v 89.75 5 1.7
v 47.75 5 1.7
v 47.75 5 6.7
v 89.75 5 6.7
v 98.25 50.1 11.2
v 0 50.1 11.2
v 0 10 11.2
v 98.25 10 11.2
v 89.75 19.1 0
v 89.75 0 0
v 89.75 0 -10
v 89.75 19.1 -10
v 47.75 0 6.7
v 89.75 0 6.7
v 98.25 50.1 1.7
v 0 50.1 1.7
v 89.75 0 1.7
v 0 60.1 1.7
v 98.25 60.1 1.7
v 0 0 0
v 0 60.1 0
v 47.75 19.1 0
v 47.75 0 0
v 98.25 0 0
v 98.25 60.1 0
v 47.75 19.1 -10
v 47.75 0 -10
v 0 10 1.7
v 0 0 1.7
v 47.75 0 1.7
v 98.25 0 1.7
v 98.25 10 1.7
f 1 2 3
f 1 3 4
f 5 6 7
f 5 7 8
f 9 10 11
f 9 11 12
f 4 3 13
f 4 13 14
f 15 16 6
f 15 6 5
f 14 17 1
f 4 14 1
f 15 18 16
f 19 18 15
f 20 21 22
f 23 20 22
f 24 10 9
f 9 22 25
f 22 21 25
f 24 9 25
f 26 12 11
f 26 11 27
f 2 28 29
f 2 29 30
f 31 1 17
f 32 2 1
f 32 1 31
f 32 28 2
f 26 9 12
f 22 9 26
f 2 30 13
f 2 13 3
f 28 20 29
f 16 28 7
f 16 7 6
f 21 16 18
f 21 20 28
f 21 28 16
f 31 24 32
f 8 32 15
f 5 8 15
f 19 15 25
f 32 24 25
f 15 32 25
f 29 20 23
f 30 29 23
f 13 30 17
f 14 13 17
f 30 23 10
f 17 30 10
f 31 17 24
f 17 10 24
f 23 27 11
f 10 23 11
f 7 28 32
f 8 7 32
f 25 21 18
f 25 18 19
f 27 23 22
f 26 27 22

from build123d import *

# Parameters (mm, degrees)
SKETCH_1_W      = 98.25
SKETCH_1_H      = 60.1
EXTRUDE_1_DEPTH = 1.7
SKETCH_2_W      = 98.25
SKETCH_2_H      = 40.1
EXTRUDE_2_DEPTH = 9.5
SKETCH_3_W      = 42
SKETCH_3_H      = 5
EXTRUDE_3_DEPTH = 5
SKETCH_4_W      = 42
SKETCH_4_H      = 19.1
EXTRUDE_4_DEPTH = 10


with BuildPart() as part:
    # Эскиз1 → Бобышка-Вытянуть1 (new body)
    with BuildSketch(Plane.XY):
        with Locations((49.125, 30.05)):
            Rectangle(SKETCH_1_W, SKETCH_1_H)
    extrude(amount=EXTRUDE_1_DEPTH)

    # Эскиз2 → Бобышка-Вытянуть2 (add)
    with BuildSketch(Plane.XY.offset(1.7)):
        with Locations((49.125, 30.05)):
            Rectangle(SKETCH_2_W, SKETCH_2_H)
    extrude(amount=EXTRUDE_2_DEPTH)

    # Эскиз3 → Бобышка-Вытянуть3 (add)
    with BuildSketch(Plane.XY.offset(1.7)):
        with Locations((68.75, 2.5)):
            Rectangle(SKETCH_3_W, SKETCH_3_H)
    extrude(amount=EXTRUDE_3_DEPTH)

    # Эскиз4 → Бобышка-Вытянуть4 (add)
    with BuildSketch(Plane(origin=(0, 0, 0), x_dir=(-1, 0, 0), z_dir=(0, 0, -1))):
        with Locations((-68.75, 9.55)):
            Rectangle(SKETCH_4_W, SKETCH_4_H)
    extrude(amount=EXTRUDE_4_DEPTH)


solid = part.part
